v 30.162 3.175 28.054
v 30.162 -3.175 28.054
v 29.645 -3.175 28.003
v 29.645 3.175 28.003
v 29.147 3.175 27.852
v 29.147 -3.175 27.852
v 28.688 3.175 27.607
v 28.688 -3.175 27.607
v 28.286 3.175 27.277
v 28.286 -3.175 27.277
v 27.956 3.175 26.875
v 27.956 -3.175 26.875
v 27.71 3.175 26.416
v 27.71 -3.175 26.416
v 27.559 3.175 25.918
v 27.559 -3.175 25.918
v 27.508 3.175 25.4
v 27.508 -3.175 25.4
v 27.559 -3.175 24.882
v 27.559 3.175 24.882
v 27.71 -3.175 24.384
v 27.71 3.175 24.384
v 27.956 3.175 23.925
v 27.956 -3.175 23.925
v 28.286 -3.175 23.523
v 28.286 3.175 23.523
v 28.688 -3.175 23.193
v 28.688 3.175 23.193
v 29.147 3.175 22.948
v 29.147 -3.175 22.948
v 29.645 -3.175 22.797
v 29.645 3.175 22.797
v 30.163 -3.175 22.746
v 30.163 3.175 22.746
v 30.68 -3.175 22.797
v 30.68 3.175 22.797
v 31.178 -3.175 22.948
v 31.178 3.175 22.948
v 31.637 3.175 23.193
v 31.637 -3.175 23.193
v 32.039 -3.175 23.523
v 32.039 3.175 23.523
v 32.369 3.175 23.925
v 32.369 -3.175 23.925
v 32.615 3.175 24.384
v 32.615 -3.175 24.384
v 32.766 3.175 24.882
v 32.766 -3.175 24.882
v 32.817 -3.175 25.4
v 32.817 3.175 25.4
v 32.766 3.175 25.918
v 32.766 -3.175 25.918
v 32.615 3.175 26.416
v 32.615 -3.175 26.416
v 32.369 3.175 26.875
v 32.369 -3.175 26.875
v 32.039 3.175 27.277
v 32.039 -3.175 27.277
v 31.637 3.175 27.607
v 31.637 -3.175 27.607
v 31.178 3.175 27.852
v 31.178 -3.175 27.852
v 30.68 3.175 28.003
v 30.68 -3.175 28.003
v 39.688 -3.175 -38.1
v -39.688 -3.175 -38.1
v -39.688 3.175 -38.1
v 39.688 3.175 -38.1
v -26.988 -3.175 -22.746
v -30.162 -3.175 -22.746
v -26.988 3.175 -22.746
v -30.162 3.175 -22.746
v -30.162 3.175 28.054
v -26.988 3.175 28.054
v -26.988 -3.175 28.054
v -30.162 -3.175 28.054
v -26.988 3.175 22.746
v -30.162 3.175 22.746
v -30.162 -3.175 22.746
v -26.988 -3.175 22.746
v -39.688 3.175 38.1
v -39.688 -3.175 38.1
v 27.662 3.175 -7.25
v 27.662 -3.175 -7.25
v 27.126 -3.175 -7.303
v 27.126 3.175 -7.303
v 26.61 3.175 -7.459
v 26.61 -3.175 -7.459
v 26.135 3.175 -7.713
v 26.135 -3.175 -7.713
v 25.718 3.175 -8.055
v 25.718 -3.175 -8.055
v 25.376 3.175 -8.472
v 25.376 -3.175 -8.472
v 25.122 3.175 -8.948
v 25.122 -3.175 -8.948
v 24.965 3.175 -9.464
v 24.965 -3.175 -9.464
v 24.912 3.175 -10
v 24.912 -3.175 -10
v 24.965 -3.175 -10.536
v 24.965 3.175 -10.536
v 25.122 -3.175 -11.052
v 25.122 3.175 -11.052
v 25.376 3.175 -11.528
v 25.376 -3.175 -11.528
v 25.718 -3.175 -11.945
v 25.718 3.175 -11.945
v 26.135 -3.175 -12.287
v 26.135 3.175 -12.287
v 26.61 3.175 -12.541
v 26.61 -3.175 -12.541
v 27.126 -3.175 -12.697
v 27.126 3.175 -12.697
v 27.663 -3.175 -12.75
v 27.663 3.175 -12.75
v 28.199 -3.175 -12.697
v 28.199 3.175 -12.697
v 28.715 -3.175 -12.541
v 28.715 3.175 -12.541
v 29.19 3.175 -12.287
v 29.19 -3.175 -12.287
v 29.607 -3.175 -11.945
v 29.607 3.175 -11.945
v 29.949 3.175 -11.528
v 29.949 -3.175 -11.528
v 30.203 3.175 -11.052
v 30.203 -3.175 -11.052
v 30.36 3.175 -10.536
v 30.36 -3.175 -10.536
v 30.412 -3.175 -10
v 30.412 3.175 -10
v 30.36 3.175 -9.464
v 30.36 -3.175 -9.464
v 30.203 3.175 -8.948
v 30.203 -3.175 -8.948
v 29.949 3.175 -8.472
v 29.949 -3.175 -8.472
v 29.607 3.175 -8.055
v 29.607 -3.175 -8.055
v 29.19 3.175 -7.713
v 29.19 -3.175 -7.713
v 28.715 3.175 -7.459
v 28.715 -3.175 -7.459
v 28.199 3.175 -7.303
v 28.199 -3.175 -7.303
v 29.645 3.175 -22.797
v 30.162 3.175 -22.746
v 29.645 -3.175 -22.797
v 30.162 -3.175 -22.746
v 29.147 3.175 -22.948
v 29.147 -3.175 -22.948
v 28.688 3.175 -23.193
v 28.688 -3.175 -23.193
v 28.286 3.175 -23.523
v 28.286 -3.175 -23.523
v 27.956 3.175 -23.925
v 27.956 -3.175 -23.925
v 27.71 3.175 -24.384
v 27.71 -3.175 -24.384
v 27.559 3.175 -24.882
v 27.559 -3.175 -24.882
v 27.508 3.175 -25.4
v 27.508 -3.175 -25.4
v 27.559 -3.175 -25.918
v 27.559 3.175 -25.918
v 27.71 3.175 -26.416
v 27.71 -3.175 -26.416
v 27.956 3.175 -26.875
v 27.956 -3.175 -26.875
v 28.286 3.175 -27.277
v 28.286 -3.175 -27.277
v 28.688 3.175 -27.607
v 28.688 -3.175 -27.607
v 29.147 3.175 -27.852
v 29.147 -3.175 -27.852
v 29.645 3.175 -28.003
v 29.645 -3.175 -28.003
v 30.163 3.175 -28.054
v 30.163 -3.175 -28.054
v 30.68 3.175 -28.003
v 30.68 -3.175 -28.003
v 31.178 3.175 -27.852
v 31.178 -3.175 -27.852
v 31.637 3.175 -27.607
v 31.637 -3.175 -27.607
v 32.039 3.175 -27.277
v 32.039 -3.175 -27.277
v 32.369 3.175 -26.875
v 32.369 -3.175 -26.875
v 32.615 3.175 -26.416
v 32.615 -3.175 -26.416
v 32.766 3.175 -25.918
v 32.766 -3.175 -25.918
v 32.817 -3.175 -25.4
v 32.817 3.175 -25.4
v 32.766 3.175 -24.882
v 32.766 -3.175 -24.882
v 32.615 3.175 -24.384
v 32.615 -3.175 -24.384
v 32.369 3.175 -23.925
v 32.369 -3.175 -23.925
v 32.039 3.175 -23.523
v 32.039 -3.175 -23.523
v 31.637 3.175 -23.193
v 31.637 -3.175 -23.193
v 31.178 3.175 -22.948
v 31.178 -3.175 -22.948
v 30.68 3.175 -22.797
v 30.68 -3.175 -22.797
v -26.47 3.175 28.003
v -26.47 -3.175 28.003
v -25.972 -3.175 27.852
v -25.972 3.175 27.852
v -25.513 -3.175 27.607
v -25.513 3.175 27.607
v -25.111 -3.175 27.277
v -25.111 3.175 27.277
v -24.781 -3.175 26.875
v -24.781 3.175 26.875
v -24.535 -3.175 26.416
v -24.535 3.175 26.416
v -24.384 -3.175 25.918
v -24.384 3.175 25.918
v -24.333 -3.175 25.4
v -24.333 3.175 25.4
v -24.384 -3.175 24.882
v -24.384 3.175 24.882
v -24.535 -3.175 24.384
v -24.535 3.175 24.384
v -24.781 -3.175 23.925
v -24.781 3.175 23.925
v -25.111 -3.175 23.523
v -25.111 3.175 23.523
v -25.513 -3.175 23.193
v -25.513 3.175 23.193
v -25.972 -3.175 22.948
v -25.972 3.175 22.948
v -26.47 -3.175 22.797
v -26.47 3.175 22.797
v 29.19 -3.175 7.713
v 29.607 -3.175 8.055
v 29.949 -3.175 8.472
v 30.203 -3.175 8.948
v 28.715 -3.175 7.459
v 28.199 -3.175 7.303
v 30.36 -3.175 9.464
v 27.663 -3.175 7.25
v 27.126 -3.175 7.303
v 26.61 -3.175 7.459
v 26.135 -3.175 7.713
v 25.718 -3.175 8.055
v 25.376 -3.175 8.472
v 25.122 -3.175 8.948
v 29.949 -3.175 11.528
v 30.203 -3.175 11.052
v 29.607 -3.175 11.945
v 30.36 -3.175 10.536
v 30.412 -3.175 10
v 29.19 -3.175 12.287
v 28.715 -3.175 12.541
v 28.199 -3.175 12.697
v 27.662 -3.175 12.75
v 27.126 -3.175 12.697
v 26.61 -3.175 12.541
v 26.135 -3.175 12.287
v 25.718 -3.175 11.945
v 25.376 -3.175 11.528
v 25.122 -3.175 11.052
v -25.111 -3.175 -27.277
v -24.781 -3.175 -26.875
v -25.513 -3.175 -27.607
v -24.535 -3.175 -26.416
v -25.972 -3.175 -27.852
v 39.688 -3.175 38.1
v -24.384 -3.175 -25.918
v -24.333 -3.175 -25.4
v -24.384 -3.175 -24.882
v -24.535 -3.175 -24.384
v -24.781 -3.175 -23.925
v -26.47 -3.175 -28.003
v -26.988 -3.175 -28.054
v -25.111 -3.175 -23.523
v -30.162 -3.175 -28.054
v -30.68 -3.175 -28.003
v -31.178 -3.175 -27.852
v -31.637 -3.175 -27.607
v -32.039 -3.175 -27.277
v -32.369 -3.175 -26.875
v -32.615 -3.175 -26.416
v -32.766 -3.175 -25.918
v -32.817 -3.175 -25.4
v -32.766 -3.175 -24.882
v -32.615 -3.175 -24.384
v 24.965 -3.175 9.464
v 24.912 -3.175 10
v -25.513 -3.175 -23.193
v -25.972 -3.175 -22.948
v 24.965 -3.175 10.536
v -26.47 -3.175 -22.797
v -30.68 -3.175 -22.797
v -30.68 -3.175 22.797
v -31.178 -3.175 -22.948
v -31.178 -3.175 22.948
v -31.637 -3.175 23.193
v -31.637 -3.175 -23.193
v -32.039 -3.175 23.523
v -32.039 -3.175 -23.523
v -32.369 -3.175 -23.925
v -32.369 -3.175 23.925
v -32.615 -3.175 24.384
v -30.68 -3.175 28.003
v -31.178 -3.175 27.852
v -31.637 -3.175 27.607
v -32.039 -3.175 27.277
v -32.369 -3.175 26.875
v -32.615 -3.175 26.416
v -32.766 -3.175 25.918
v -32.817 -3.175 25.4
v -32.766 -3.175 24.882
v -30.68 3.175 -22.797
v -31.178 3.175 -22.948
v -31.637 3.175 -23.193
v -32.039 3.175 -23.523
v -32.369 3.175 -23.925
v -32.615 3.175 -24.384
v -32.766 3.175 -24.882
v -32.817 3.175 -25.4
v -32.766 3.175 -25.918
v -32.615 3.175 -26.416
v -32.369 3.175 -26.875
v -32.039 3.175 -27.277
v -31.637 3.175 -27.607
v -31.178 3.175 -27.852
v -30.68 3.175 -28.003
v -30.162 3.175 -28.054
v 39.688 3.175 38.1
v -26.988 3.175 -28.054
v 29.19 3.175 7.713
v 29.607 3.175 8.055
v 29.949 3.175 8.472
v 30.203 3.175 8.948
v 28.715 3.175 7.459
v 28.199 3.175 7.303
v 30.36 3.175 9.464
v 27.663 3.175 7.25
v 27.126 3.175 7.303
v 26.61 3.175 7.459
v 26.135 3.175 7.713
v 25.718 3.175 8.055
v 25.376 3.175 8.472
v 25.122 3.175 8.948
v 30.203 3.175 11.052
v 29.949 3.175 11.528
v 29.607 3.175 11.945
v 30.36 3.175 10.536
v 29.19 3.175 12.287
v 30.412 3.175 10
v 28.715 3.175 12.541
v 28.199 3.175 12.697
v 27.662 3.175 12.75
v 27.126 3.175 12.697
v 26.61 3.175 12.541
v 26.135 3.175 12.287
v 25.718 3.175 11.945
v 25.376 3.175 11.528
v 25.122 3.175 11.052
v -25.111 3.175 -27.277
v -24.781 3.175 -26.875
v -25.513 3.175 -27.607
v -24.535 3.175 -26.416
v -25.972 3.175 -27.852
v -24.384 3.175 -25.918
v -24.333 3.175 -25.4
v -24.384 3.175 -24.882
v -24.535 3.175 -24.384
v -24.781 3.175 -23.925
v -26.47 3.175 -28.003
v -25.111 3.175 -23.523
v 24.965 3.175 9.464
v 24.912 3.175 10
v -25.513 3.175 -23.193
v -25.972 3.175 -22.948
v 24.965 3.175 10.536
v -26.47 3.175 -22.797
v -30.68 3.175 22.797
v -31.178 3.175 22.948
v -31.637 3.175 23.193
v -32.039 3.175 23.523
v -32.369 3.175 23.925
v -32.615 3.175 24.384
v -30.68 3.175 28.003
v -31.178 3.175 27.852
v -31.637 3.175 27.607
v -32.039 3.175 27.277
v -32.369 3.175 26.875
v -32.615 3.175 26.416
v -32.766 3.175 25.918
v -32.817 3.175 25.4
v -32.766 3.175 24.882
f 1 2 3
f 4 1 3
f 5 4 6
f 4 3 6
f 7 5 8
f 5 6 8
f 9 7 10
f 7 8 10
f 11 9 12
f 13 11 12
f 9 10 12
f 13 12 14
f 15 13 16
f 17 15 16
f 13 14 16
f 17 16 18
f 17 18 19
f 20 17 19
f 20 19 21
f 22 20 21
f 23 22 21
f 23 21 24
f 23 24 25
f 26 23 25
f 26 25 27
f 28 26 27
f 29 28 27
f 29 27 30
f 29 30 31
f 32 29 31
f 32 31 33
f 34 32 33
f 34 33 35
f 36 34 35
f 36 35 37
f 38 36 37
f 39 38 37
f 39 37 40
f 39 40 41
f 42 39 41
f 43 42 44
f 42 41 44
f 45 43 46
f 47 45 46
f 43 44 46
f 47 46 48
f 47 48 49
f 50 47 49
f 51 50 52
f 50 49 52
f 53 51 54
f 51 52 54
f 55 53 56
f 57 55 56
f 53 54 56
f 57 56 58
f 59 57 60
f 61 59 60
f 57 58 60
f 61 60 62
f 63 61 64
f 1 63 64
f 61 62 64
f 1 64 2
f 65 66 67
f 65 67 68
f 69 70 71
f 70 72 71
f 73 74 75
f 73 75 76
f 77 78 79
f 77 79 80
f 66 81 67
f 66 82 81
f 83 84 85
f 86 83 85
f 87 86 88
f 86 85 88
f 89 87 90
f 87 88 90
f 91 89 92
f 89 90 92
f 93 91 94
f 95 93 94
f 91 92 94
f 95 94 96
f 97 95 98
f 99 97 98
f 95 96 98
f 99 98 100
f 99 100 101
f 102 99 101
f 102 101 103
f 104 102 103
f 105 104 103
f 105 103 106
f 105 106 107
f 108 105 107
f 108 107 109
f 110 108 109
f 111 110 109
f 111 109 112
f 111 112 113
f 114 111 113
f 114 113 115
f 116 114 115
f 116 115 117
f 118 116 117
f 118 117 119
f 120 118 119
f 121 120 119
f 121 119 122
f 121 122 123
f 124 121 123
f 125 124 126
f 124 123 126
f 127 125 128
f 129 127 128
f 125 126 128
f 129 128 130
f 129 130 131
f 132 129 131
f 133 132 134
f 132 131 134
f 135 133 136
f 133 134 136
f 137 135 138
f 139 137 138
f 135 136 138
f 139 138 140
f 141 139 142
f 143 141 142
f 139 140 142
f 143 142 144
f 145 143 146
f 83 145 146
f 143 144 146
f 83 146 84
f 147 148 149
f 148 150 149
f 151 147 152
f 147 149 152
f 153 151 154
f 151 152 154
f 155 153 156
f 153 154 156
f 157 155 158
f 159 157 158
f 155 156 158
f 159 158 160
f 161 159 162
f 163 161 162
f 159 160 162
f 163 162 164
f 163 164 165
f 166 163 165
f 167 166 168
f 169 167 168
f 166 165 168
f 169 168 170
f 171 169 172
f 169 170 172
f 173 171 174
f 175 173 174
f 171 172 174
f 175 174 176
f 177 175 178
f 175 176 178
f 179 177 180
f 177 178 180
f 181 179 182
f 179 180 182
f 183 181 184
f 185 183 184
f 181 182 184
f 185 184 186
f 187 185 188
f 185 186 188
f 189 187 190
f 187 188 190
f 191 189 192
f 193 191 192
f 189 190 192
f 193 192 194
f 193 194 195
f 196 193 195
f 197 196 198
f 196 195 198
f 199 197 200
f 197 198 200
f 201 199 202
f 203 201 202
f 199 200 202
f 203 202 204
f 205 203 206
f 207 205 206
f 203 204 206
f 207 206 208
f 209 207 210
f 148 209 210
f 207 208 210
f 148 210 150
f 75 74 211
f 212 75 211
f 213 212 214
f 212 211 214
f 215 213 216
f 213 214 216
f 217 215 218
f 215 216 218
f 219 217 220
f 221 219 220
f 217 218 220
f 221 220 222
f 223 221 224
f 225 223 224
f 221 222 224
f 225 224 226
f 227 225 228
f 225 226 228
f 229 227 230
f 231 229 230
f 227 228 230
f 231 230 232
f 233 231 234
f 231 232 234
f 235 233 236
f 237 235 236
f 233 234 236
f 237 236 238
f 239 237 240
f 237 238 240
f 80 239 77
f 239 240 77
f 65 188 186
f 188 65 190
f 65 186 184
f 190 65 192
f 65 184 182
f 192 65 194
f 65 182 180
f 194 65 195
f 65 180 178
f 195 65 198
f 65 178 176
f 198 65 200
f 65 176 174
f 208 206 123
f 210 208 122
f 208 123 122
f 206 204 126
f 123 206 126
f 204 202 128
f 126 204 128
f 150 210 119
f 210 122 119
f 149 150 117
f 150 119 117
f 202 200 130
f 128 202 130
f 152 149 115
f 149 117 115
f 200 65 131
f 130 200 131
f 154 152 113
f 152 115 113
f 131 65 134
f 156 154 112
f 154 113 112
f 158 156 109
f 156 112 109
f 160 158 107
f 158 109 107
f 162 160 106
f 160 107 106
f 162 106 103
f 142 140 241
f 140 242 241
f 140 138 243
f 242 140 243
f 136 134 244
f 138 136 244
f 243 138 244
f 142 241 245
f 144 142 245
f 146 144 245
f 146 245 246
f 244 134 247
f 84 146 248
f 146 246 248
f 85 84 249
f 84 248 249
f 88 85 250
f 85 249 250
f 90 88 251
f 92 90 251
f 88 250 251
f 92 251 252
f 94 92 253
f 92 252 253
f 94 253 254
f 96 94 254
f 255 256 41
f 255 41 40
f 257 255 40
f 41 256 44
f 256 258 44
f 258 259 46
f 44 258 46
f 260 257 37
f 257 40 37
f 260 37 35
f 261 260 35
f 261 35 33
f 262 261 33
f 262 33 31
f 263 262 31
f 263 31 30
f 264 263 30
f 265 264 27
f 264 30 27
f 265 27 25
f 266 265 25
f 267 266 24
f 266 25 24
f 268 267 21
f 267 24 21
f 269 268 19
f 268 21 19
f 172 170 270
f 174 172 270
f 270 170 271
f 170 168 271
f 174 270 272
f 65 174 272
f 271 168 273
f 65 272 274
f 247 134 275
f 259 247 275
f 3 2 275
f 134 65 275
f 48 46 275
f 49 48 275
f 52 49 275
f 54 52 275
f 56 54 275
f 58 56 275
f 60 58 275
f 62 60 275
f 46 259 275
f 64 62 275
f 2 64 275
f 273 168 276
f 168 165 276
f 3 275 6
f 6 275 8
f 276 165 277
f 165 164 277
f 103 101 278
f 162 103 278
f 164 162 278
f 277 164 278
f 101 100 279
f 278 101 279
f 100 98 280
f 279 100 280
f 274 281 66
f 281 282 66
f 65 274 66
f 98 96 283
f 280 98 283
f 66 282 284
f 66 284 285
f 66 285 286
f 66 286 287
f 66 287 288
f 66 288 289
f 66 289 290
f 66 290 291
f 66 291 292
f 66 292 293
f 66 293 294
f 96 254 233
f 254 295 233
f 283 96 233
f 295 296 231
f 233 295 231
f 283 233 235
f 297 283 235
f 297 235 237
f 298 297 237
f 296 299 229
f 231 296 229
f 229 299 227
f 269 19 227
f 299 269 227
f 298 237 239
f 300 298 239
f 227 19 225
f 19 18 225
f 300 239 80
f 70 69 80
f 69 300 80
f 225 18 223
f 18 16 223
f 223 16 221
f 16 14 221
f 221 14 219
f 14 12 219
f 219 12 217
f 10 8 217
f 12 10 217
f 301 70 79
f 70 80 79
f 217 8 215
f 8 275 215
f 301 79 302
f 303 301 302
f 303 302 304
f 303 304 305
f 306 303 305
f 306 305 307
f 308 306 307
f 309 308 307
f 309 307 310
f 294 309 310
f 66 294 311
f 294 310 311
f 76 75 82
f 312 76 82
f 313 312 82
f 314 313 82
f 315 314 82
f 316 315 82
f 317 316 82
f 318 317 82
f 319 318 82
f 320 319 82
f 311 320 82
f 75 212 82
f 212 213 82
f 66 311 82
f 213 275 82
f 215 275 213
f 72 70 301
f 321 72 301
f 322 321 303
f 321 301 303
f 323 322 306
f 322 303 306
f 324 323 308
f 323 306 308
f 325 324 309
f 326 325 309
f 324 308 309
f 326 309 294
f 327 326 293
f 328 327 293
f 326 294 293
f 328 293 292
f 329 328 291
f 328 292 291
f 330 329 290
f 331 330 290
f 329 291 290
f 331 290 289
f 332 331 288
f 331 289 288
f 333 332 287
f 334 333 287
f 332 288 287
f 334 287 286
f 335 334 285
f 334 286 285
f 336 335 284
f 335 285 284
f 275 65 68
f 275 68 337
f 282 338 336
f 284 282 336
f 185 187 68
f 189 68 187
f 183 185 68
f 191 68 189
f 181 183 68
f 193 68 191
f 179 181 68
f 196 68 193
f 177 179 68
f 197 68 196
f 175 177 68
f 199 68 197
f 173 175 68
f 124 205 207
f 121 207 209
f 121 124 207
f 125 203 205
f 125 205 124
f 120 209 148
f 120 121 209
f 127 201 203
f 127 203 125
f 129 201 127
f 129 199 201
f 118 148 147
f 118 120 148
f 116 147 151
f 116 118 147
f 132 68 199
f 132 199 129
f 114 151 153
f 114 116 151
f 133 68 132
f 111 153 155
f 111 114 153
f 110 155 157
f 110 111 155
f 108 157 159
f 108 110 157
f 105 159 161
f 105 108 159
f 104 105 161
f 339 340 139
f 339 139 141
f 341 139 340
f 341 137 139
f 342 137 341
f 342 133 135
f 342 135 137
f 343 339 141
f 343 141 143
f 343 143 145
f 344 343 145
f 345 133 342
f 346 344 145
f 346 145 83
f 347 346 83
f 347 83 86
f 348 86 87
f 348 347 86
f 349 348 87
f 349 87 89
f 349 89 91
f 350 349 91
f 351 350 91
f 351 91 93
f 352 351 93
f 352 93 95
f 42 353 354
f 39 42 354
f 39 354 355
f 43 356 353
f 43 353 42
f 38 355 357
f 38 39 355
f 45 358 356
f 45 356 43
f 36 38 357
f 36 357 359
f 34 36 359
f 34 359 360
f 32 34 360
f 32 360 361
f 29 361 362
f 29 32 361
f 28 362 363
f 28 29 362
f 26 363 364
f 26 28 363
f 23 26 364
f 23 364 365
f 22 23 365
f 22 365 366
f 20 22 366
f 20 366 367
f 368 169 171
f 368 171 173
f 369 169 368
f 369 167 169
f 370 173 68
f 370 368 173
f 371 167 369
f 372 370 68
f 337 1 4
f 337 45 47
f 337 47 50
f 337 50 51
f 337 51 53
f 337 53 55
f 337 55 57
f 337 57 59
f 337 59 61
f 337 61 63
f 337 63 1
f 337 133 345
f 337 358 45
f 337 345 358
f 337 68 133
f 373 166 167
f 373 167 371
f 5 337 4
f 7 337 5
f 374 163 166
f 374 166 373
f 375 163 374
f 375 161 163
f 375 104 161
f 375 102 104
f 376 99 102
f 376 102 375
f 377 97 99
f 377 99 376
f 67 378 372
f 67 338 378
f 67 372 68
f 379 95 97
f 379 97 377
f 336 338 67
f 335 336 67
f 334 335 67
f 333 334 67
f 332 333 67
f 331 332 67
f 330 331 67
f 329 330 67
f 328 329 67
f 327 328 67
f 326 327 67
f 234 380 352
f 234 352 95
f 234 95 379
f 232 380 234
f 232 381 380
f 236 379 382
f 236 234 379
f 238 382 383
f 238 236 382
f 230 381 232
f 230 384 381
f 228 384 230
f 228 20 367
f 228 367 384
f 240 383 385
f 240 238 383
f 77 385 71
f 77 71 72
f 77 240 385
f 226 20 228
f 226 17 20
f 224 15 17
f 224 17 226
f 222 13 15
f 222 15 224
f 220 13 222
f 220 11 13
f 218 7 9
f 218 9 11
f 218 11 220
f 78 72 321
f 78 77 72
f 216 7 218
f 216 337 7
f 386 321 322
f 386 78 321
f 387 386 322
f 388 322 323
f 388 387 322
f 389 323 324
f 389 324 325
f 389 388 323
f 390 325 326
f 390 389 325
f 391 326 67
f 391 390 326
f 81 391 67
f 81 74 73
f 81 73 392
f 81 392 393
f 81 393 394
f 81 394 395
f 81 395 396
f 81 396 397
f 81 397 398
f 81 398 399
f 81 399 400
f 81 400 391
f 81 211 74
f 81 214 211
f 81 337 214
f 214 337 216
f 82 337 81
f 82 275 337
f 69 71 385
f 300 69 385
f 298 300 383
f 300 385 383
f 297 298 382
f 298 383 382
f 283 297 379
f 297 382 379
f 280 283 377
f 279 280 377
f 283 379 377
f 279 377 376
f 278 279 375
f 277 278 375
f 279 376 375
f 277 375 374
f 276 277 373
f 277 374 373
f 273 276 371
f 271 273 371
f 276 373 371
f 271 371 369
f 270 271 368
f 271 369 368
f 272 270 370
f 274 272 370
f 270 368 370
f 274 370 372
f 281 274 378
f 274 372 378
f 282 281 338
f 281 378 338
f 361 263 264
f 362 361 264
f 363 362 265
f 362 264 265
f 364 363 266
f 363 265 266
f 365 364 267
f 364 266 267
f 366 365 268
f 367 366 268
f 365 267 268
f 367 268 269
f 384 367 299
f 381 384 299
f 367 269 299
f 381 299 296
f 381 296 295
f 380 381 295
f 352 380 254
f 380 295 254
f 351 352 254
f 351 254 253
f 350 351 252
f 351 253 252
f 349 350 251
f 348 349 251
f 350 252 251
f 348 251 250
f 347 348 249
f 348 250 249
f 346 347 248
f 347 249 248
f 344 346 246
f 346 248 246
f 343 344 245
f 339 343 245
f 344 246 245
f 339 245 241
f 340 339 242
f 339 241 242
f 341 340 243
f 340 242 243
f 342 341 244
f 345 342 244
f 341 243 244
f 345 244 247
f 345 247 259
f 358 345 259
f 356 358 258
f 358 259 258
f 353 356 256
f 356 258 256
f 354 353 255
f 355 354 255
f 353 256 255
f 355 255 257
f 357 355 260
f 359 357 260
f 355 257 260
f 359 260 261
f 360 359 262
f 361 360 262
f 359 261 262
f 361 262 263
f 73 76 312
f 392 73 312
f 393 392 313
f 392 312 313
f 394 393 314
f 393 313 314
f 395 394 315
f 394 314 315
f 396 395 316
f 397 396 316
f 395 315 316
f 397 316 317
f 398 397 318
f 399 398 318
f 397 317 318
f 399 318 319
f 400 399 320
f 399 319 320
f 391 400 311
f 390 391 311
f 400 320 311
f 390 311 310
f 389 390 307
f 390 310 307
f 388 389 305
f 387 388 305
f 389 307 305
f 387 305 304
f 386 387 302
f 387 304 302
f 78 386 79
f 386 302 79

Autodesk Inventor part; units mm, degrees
ref_plane "YZ Plane" through (0, 0, 0) normal (1, 0, 0) x (0, 1, 0)
ref_plane "XZ Plane" through (0, 0, 0) normal (0, 1, 0) x (-1, 0, 0)
ref_plane "XY Plane" through (0, 0, 0) normal (0, 0, 1) x (1, 0, 0)
sketch "Sketch1" plane through (0, 0, 0) normal (0, 1, 0) x (-1, 0, 0)
  line L0 (39.6875, -38.1) -> (-39.6875, -38.1)
  line L1 (-39.6875, -38.1) -> (-39.6875, 38.1)
  line L2 (-39.6875, 38.1) -> (39.6875, 38.1)
  line L3 (39.6875, 38.1) -> (39.6875, -38.1)
  line L4 (39.6875, -38.1) -> (-39.6875, 38.1) construction
  line L5 (-39.6875, -38.1) -> (39.6875, 38.1) construction
  point P0 (0, 0)
  dimension "d0" = 76.2
  dimension "d1" = 79.375
extrude "Extrusion1" add sketch "Sketch1" along normal mid plane 6.35
sketch "Sketch2" plane through (0, 3.175, 0) normal (0, 1, 0) x (1, 0, 0)
  line L0 (-39.6875, 38.1) -> (-39.6875, -38.1) projected
  line L1 (39.6875, -38.1) -> (39.6875, 38.1) projected
  line L2 (39.6875, 38.1) -> (-39.6875, 38.1) projected
  line L3 (-39.6875, -38.1) -> (39.6875, -38.1) projected
  point P0 (0, 0)
  point P1 (-30.1625, 25.4)
  point P2 (-30.1625, -25.4)
  point P3 (30.1625, 25.4)
  point P4 (30.1625, -25.4)
  dimension "d4" = 9.525
  dimension "d5" = 9.525
  dimension "d6" = 9.525
  dimension "d7" = 9.525
  dimension "d8" = 12.7
  dimension "d9" = 12.7
  dimension "d10" = 12.7
  dimension "d11" = 12.7
hole "Hole1" at (-30.1625, 3.175, -25.4) at (-30.1625, 3.175, 25.4) at (30.1625, 3.175, -25.4) at (30.1625, 3.175, 25.4) direction (0, -1, 0) diameter 5.3086 end through all clearance for "Socket Head Cap Screw" size "M5" standard "Ansi Metric M Profile"
sketch "Sketch3" plane through (0, 3.175, 0) normal (0, 1, 0) x (1, 0, 0)
  circle A0 centre (30.1625, 25.4) radius 2.6543 projected
  circle A1 centre (-30.1625, 25.4) radius 2.6543 projected
  circle A2 centre (-30.1625, -25.4) radius 2.6543 projected
  circle A3 centre (30.1625, -25.4) radius 2.6543 projected
  line L0 (39.6875, -38.1) -> (39.6875, 38.1) projected
  line L1 (39.6875, 38.1) -> (-39.6875, 38.1) projected
  line L2 (-39.6875, 38.1) -> (-39.6875, -38.1) projected
  line L3 (-39.6875, -38.1) -> (39.6875, -38.1) projected
  line L4 (-30.1625, 25.4) -> (-26.9875, 25.4) construction
  line L5 (-30.1625, 22.7457) -> (-26.9875, 22.7457)
  line L6 (-26.9875, 28.0543) -> (-30.1625, 28.0543)
  arc A4 (-30.1625, 28.0543) -> (-30.1625, 22.7457) centre (-30.1625, 25.4) ccw
  arc A5 (-26.9875, 22.7457) -> (-26.9875, 28.0543) centre (-26.9875, 25.4) ccw
  line L7 (-30.1625, -25.4) -> (-26.9875, -25.4) construction
  line L8 (-30.1625, -22.7457) -> (-26.9875, -22.7457)
  line L9 (-26.9875, -28.0543) -> (-30.1625, -28.0543)
  arc A6 (-30.1625, -22.7457) -> (-30.1625, -28.0543) centre (-30.1625, -25.4) ccw
  arc A7 (-26.9875, -28.0543) -> (-26.9875, -22.7457) centre (-26.9875, -25.4) ccw
  point P0 (0, 0)
  point P1 (-28.575, 25.4)
  point P2 (-28.575, -25.4)
  dimension "d19" = 3.175
  dimension "d20" = 3.175
extrude "Extrusion2" cut sketch "Sketch3" against normal blind 6.35 contours A1 L6 A5 L5 | A2 L8 A7 L9
sketch "Sketch4" plane through (0, 3.175, 0) normal (0, 1, 0) x (1, 0, 0)
  line L0 (39.6875, -38.1) -> (39.6875, 38.1) projected
  line L1 (39.6875, 38.1) -> (-39.6875, 38.1) projected
  line L2 (-39.6875, -38.1) -> (39.6875, -38.1) projected
  circle A0 centre (30.1625, 25.4) radius 2.6543 projected
  circle A1 centre (30.1625, -25.4) radius 2.6543 projected
  point P0 (0, 0)
  point P1 (27.6625, 10)
  point P2 (27.6625, -10)
  dimension "d33" = 15.4
  dimension "d34" = 2.5
  dimension "d35" = 15.4
hole "Hole2" at (27.6625, 3.175, -10) at (27.6625, 3.175, 10) direction (0, -1, 0) diameter 5.5 end through all
equation "\"d5\" = d4"
equation "\"d6\" = d5"
equation "\"d7\" = d4"
equation "\"d9\" = d8"
equation "\"d10\" = d8"
equation "\"d11\" = d10"
equation "\"d20\" = d19"
equation "\"d35\" = d33"
properties part number "X-Axis_End_Plate_LM3004" material "Polycarbonate, Smoke"
